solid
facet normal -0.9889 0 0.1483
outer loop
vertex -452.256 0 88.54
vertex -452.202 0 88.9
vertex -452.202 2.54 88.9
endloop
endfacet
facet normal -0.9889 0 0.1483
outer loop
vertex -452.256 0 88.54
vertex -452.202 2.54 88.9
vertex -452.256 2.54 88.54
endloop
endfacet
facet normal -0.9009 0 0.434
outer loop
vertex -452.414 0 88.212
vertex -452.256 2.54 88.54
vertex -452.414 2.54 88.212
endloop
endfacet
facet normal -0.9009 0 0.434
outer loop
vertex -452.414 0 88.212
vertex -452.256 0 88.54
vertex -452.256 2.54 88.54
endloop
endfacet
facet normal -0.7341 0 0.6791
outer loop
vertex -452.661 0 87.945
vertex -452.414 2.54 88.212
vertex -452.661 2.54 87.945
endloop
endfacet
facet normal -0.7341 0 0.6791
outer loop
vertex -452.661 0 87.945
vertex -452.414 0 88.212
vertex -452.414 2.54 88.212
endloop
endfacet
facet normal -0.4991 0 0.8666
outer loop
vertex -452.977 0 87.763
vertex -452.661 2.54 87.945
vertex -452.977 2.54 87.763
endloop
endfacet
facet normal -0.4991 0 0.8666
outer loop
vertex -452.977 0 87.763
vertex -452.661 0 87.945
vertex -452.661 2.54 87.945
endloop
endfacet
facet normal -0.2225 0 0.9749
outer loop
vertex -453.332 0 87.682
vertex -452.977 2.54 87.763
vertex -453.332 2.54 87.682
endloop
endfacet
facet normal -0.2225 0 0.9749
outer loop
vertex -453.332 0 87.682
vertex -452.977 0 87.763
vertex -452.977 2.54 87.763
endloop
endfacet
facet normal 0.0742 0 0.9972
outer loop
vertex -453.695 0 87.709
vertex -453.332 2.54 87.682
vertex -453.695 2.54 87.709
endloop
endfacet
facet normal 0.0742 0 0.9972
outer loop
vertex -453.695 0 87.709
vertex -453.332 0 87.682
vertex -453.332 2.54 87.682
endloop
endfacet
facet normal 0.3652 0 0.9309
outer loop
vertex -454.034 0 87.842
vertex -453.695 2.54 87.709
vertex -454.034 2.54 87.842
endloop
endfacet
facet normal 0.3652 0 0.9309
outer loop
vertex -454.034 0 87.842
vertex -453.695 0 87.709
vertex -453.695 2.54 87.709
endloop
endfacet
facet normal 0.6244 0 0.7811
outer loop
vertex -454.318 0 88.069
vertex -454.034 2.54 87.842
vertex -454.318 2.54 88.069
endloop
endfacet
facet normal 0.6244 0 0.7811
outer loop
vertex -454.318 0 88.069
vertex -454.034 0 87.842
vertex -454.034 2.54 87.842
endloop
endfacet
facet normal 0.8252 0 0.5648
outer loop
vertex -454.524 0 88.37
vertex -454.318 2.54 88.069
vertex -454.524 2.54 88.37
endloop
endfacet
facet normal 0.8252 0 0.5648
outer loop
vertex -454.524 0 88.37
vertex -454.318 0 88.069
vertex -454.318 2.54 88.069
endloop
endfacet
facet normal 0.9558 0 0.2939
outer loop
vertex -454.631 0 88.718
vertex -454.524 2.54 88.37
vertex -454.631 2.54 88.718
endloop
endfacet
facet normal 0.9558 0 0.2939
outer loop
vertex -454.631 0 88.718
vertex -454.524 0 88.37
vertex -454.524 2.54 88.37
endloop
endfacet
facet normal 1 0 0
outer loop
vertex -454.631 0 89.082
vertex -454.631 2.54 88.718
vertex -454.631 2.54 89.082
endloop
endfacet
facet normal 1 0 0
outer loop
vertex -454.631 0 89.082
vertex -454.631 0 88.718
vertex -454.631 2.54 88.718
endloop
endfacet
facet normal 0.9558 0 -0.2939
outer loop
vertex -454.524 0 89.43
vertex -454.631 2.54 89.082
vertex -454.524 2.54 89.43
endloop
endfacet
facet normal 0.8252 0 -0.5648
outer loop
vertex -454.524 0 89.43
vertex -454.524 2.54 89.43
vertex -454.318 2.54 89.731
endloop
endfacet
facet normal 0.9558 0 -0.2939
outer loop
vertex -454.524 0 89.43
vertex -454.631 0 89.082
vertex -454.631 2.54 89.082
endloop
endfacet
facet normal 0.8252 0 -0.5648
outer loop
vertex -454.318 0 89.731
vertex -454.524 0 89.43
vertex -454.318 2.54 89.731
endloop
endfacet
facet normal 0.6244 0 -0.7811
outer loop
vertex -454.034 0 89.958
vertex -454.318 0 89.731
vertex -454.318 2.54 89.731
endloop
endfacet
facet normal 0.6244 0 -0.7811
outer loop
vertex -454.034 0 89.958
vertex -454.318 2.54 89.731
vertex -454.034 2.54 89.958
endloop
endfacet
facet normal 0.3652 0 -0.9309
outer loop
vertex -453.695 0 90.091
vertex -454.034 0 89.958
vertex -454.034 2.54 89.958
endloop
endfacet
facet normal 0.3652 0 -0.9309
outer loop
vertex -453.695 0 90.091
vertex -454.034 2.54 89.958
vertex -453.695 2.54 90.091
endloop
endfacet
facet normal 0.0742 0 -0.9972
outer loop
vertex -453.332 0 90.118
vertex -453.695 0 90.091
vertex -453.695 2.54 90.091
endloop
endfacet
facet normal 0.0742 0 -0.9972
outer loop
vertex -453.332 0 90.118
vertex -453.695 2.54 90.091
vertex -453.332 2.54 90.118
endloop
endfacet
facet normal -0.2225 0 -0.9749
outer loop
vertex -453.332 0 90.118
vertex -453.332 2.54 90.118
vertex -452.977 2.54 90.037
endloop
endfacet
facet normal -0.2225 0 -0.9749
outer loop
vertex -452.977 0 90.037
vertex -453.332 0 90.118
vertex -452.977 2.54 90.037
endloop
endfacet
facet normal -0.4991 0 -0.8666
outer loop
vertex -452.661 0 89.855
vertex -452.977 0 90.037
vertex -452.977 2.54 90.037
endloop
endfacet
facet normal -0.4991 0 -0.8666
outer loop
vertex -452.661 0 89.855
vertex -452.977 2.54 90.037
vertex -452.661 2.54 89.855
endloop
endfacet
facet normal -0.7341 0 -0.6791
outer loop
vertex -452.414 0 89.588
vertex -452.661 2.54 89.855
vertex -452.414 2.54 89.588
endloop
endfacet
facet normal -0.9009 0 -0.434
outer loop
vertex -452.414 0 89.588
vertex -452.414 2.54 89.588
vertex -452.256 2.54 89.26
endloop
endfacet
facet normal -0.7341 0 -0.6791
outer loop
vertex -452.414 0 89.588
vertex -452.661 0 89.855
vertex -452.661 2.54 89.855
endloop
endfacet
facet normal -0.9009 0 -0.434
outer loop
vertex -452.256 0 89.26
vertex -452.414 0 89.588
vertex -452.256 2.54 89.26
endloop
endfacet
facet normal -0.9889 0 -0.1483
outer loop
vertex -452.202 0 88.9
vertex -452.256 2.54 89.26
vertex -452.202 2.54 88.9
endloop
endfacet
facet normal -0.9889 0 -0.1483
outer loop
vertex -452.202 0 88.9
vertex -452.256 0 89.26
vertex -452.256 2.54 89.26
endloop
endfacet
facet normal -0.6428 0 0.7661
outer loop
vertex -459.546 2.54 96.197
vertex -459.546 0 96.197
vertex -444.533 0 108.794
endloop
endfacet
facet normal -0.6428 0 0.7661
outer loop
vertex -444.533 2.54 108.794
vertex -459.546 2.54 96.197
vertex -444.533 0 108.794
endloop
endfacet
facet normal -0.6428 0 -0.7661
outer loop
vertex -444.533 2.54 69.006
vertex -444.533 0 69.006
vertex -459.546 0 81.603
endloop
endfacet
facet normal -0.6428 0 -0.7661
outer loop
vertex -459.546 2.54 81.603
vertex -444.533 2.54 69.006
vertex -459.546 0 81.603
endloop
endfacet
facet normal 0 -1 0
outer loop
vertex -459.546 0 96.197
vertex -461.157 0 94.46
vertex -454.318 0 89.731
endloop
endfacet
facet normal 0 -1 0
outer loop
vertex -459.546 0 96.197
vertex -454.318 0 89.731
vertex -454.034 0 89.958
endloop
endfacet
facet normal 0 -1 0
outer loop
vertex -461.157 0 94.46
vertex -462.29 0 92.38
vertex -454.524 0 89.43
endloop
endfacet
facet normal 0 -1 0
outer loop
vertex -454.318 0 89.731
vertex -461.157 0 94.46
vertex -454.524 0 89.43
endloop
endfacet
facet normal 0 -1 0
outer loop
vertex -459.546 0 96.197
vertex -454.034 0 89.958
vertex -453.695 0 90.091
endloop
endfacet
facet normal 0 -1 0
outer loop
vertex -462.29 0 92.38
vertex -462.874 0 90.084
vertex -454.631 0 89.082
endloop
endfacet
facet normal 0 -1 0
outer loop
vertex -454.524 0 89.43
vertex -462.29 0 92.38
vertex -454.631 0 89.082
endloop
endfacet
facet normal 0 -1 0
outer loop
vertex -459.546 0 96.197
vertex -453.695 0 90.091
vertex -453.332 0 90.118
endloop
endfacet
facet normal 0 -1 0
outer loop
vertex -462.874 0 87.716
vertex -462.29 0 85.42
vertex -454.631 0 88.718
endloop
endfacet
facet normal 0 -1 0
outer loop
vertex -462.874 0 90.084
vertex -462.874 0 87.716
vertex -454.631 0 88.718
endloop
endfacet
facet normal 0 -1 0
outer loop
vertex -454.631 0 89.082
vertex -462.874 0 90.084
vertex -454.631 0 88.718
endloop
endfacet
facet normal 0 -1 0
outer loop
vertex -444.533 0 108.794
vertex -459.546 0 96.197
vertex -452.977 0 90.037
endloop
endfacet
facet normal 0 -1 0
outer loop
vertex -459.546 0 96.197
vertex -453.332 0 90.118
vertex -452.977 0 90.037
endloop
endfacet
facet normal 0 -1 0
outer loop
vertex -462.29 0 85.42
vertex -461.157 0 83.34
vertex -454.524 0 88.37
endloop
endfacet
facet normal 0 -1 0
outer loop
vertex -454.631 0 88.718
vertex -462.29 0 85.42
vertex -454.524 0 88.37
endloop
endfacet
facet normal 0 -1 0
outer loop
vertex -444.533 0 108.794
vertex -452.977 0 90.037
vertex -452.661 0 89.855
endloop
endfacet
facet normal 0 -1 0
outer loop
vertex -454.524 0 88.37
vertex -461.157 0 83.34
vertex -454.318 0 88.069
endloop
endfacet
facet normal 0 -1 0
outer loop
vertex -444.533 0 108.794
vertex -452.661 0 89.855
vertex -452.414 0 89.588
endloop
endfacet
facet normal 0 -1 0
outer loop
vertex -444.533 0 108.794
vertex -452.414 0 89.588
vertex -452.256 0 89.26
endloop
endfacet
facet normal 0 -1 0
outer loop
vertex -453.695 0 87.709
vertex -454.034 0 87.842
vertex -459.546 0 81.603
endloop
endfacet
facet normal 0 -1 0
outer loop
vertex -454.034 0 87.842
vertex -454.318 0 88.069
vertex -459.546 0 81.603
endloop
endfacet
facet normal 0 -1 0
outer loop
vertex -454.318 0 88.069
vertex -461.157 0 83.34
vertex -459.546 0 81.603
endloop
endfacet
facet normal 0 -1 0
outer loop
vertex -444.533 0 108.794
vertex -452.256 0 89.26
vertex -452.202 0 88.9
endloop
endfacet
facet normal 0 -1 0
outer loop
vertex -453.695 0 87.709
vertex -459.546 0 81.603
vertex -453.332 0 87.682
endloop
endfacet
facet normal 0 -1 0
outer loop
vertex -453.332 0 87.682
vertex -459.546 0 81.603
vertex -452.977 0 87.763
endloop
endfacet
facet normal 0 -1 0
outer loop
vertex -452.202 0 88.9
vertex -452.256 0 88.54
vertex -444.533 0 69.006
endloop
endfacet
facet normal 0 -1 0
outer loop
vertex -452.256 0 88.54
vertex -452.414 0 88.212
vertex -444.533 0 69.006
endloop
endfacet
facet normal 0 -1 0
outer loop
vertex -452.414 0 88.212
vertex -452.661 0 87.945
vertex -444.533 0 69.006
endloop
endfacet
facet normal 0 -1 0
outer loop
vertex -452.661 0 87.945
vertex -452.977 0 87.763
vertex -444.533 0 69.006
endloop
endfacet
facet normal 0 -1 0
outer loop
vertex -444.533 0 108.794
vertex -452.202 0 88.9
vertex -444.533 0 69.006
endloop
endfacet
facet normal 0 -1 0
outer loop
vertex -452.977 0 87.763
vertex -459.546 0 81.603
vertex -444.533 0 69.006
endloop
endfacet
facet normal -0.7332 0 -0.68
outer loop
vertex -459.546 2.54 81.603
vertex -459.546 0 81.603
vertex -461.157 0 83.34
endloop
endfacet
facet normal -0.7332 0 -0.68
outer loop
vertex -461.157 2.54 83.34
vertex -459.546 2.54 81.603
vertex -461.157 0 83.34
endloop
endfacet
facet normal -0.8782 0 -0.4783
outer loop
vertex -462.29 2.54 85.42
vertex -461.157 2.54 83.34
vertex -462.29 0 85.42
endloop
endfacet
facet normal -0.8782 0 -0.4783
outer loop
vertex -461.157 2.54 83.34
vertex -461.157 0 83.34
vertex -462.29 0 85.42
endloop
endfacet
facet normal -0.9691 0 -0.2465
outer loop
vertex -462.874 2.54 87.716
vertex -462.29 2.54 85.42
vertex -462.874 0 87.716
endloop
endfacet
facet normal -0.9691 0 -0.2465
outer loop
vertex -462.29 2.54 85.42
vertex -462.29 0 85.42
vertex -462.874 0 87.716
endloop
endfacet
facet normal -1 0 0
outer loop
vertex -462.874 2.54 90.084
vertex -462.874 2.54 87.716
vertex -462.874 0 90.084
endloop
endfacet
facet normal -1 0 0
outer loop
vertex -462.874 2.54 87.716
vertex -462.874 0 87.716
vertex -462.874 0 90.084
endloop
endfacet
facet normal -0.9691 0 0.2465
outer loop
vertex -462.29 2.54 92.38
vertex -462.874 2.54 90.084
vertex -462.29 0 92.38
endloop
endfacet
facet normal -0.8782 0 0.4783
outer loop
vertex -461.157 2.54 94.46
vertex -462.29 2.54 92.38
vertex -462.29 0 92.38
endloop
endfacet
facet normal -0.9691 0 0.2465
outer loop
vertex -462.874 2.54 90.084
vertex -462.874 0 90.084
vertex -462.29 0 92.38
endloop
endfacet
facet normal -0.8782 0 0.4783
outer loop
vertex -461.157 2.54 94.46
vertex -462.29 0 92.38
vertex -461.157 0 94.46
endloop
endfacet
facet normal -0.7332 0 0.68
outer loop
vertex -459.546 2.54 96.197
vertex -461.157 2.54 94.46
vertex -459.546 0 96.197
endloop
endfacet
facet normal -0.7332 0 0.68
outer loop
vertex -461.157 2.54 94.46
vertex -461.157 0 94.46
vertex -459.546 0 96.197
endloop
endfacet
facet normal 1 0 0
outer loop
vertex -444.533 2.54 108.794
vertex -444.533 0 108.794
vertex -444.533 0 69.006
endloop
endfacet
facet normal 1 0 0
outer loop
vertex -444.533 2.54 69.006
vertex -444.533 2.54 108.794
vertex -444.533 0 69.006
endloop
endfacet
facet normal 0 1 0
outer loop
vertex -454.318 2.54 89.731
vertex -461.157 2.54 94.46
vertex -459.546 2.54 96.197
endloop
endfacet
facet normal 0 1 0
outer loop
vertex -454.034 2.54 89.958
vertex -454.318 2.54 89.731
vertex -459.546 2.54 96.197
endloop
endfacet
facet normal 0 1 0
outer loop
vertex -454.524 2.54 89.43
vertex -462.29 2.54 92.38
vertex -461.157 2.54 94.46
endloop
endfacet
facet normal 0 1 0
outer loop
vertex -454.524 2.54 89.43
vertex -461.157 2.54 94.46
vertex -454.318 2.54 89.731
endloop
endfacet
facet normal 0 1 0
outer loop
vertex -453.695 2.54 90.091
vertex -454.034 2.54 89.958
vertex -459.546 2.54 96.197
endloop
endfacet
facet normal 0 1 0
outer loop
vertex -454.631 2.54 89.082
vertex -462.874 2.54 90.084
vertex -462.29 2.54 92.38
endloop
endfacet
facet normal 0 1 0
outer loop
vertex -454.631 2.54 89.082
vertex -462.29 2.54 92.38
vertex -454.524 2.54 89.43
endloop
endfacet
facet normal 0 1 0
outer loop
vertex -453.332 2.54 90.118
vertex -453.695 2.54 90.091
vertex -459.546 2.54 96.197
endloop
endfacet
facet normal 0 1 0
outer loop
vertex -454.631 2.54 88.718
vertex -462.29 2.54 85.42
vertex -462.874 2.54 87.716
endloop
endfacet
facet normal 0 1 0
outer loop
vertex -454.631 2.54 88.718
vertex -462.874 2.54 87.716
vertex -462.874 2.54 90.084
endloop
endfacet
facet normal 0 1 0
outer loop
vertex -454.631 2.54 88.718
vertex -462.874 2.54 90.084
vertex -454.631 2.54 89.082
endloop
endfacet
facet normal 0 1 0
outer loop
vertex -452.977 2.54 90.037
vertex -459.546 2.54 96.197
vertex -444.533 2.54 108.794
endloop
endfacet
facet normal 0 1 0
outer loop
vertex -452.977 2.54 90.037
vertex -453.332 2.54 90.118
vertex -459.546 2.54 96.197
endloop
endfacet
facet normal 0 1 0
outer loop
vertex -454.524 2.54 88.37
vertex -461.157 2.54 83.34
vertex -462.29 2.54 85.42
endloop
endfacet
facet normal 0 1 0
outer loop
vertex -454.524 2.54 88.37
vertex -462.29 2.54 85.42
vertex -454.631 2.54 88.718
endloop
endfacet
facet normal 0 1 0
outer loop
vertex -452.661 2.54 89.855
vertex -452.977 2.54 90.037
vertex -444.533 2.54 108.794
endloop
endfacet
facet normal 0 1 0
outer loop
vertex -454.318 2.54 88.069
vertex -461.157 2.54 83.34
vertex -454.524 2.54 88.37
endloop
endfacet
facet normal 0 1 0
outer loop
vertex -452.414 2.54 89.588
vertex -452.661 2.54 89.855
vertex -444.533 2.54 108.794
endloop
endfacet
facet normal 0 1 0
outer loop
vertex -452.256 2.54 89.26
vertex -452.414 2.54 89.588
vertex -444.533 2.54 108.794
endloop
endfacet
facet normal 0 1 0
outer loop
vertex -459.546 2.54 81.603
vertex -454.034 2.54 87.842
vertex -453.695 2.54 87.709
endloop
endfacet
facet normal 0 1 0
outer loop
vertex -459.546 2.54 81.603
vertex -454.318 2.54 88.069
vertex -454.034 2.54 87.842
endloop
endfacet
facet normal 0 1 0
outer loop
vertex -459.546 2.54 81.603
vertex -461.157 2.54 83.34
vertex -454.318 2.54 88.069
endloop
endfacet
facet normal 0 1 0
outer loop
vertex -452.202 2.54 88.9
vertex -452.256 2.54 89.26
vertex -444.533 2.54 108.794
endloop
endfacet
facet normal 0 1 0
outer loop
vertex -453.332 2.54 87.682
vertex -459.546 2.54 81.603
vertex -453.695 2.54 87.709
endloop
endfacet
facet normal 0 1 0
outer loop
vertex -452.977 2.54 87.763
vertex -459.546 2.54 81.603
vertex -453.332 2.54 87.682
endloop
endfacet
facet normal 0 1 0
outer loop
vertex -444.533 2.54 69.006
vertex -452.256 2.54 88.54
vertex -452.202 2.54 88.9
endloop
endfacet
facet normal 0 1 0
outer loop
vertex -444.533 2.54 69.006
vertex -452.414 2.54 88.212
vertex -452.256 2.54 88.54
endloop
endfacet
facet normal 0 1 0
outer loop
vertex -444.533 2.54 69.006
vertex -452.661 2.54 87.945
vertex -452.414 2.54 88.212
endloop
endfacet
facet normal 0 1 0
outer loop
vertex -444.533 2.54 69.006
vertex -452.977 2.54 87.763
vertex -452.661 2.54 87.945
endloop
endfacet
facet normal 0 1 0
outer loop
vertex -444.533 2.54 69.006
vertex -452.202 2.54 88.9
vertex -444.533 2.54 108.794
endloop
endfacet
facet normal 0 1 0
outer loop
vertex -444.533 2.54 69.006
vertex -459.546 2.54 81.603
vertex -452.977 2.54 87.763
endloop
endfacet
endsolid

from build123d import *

# Parameters (mm, degrees)
SKETCH1_R           = 1.22148615
BOSS_EXTRUDE1_DEPTH = 2.54


with BuildPart() as part:
    # Sketch1 → Boss-Extrude1 (new body)
    with BuildSketch(Plane(origin=(0, 0, 0), x_dir=(1, 0, 0), z_dir=(0, 1, 0))):
        with BuildLine():
            Line((-444.533071271, -69.006399848), (-459.545623253, -81.603426679))
            ThreePointArc((-459.545623253, -81.603426679), (-462.948071271, -88.9), (-459.545623253, -96.196573321))
            Line((-459.545623253, -96.196573321), (-444.533071271, -108.793600152))
            Line((-444.533071271, -108.793600152), (-444.533071271, -69.006399848))
        make_face()
        with Locations((-453.423071271, -88.9)):
            Circle(SKETCH1_R, mode=Mode.SUBTRACT)
    extrude(amount=BOSS_EXTRUDE1_DEPTH)


solid = part.part
